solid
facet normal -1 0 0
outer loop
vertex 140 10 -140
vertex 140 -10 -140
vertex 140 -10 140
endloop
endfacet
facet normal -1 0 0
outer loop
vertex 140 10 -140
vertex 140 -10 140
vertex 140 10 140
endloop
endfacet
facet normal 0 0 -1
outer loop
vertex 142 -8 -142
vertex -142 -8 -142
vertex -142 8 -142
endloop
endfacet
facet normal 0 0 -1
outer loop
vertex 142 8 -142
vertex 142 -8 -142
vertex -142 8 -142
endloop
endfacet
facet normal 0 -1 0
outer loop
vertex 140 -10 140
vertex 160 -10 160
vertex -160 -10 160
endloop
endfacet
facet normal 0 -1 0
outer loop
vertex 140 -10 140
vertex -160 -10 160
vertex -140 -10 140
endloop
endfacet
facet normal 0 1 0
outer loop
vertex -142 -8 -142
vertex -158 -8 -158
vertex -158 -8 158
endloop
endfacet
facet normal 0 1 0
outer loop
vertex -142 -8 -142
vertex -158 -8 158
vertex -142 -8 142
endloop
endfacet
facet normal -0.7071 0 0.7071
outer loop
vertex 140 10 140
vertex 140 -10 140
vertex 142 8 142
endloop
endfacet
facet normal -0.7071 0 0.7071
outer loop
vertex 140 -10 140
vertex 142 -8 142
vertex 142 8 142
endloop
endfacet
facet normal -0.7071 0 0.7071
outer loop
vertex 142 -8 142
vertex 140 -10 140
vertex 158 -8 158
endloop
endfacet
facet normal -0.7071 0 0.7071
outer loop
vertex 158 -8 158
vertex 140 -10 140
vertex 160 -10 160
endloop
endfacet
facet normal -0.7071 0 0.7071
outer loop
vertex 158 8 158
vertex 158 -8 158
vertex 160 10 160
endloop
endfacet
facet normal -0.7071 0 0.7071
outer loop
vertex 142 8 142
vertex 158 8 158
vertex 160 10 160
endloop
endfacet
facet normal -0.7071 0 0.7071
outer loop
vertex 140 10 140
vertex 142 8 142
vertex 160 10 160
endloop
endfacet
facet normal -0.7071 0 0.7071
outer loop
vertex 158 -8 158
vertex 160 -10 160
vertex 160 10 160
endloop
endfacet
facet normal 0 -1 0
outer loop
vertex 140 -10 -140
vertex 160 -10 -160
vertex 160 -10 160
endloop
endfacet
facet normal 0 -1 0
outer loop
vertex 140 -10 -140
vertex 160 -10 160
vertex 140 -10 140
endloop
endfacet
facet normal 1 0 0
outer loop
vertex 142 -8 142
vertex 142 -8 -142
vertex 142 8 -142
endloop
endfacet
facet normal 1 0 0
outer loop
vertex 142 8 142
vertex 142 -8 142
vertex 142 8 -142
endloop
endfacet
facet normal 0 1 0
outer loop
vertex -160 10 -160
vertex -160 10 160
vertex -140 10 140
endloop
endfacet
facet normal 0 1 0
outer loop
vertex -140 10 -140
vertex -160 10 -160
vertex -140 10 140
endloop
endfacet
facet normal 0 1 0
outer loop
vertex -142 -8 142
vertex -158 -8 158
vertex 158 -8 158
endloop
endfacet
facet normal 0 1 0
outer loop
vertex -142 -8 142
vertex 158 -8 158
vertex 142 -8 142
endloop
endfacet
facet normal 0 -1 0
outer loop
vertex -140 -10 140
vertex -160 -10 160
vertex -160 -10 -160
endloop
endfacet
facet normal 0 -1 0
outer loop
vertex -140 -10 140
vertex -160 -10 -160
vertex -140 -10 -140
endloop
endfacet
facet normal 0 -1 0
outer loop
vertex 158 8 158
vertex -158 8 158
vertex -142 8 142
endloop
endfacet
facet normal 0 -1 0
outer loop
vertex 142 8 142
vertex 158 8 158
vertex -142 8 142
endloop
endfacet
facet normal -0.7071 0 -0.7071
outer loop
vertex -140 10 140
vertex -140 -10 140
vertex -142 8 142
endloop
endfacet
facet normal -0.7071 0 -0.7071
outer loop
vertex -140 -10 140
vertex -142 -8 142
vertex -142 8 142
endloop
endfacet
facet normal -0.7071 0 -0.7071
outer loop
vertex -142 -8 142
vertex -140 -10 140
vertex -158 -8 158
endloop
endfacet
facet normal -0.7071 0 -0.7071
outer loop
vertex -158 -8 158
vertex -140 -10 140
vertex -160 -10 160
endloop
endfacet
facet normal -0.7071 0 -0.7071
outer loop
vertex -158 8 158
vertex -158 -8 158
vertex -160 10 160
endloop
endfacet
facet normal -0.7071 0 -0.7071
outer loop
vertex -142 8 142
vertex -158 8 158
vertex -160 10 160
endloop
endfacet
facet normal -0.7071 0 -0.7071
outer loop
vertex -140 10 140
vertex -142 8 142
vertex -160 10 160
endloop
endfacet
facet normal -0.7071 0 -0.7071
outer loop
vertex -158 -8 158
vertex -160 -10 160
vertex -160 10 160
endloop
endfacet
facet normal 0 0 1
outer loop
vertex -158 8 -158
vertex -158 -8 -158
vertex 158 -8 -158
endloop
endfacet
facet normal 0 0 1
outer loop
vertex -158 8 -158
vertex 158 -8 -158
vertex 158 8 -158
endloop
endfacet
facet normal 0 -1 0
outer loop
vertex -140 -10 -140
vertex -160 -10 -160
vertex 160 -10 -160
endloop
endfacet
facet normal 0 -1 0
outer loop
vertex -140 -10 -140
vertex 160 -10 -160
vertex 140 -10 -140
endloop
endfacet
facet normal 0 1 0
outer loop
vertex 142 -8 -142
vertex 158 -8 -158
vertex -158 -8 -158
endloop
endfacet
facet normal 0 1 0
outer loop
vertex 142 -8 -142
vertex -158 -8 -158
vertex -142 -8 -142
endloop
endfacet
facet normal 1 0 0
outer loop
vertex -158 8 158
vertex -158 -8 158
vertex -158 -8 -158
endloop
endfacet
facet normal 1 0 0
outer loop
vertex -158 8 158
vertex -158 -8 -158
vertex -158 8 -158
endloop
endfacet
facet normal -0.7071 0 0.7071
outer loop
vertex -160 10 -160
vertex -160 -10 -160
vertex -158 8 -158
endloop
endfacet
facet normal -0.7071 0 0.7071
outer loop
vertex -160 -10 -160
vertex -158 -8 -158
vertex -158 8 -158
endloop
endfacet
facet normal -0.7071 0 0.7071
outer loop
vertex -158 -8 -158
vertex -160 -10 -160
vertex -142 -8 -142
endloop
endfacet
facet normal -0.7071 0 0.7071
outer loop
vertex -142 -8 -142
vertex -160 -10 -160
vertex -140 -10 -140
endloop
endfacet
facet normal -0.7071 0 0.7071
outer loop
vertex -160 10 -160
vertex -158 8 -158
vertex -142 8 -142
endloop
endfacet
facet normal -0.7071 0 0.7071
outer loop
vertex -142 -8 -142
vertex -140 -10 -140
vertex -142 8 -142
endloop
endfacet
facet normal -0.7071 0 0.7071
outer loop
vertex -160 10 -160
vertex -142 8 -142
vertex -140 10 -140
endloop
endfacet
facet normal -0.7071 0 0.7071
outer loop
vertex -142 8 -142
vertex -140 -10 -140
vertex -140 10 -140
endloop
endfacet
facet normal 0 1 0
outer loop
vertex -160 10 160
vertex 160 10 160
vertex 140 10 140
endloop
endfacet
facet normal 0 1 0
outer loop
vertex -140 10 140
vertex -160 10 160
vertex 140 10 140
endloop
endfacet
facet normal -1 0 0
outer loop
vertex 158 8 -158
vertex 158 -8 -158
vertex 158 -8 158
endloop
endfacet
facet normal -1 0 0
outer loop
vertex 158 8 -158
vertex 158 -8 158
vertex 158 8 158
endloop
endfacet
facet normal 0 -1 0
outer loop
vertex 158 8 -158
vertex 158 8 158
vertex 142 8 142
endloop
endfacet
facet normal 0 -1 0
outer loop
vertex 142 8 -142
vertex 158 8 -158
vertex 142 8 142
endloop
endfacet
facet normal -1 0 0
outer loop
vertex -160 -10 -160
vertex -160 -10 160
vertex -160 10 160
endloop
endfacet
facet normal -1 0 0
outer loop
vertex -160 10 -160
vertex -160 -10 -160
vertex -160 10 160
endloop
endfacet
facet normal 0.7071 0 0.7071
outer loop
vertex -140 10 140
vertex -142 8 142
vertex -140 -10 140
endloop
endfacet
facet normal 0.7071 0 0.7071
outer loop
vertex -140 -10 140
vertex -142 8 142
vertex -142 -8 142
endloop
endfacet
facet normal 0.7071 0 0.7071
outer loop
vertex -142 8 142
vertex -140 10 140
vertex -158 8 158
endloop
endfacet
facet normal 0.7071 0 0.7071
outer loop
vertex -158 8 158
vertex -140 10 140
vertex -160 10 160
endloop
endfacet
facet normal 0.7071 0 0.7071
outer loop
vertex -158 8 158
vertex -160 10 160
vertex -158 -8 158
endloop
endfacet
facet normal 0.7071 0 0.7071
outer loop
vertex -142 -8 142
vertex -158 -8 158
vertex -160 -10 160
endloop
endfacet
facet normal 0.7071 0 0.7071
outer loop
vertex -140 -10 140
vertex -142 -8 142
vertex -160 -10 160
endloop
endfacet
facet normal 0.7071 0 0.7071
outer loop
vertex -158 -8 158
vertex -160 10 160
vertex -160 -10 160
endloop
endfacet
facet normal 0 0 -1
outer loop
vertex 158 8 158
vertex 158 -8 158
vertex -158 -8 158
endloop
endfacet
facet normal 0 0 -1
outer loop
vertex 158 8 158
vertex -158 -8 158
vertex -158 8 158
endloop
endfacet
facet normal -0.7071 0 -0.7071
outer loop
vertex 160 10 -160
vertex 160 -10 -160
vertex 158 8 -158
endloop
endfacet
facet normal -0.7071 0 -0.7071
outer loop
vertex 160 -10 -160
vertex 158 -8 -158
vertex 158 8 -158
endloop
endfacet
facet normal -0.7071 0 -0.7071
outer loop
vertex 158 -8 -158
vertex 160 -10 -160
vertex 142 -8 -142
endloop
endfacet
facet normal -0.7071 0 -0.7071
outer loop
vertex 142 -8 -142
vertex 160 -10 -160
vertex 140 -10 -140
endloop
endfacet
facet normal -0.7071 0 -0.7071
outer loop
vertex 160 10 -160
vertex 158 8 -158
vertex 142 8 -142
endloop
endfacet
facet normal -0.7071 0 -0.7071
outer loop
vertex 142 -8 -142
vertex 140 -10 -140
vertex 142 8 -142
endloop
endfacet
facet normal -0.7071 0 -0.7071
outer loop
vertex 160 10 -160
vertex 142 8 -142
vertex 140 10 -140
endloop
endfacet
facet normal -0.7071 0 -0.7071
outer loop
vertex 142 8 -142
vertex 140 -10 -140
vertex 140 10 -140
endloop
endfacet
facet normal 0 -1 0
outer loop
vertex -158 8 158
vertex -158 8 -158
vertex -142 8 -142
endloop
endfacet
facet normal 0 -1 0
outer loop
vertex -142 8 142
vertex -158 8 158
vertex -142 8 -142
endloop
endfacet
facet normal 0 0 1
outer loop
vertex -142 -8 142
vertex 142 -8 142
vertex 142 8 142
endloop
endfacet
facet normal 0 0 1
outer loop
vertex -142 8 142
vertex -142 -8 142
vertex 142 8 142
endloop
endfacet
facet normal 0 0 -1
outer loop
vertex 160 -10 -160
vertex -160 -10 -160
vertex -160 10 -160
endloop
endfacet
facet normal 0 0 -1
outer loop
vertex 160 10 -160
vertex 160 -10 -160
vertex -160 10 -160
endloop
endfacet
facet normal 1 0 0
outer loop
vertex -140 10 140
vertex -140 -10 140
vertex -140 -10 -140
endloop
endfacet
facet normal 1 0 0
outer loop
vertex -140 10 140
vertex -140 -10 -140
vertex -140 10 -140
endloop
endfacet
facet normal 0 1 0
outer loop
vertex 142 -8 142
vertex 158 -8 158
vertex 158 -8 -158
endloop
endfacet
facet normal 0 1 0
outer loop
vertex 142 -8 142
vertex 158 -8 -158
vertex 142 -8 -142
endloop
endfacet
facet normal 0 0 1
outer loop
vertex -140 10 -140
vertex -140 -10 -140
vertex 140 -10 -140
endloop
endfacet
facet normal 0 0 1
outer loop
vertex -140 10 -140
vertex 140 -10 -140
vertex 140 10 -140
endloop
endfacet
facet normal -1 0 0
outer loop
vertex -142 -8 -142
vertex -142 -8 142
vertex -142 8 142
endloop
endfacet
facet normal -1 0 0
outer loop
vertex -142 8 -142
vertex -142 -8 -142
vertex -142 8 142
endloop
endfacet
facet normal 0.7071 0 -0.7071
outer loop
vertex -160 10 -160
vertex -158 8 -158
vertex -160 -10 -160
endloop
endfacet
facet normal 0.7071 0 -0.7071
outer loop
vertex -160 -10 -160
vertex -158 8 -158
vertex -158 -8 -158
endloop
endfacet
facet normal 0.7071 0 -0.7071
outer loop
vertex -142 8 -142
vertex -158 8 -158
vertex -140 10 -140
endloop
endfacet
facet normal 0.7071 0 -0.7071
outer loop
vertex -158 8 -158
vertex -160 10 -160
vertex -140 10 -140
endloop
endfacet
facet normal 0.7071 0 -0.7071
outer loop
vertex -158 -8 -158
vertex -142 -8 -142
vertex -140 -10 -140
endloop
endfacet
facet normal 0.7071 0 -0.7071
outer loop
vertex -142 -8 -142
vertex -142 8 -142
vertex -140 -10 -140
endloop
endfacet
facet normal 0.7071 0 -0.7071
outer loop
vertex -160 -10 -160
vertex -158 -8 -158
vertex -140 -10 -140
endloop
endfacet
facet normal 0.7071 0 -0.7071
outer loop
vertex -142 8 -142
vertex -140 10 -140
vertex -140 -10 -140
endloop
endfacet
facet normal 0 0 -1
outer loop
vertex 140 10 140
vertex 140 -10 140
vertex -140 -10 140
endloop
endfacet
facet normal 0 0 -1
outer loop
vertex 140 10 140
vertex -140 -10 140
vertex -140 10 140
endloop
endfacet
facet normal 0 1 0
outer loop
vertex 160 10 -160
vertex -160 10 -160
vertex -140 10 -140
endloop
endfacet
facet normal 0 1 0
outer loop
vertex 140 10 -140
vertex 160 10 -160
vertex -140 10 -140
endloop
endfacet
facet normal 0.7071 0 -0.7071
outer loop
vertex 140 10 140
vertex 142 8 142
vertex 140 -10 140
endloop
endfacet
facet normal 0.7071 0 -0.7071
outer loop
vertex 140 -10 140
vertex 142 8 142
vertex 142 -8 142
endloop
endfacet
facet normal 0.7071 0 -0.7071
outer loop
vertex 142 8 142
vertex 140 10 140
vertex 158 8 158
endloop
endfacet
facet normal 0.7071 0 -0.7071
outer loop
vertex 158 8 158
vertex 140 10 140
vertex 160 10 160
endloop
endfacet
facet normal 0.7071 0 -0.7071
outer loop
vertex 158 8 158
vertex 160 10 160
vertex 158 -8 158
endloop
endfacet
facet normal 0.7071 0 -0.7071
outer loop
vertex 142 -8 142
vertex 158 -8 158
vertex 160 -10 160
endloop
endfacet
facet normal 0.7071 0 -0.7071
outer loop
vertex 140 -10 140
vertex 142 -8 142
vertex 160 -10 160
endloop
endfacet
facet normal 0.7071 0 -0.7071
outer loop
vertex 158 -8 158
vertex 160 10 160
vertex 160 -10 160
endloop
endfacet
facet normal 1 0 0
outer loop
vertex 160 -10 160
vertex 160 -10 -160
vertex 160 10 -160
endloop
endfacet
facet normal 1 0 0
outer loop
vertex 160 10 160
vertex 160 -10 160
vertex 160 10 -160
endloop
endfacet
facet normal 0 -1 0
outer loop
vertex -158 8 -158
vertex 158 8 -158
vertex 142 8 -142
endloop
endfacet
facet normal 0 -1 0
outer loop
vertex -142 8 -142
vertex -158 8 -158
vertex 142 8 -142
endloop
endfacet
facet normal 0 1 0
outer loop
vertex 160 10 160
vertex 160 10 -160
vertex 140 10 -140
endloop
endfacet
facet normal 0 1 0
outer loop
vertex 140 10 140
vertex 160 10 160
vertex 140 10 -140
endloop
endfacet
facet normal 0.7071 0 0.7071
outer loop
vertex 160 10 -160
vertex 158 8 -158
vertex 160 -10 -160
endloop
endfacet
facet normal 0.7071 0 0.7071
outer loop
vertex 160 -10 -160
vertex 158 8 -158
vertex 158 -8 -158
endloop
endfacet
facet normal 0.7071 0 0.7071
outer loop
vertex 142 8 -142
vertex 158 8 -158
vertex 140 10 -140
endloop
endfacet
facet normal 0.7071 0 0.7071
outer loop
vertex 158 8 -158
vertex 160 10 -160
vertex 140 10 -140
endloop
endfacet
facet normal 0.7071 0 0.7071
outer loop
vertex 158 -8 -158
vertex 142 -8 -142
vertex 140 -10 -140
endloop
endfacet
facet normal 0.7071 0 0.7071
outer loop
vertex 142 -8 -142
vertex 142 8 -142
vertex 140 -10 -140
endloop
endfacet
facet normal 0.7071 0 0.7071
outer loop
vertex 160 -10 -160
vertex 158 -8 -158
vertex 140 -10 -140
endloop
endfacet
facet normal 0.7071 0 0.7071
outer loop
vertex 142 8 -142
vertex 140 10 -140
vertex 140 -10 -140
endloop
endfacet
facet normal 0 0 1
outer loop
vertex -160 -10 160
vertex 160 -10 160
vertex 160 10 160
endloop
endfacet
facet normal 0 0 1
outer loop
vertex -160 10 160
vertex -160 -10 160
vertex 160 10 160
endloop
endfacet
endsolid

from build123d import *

# Parameters (mm, degrees)
TUBO_CUADRADO_20_X_20_X_2_2_DEPTH      = 315.142135624
TUBO_CUADRADO_20_X_20_X_2_2_DEPTH_BACK = 15.142135624
SKETCH1_W                              = 20
SKETCH1_H                              = 20
SKETCH1_W_2                            = 16
SKETCH1_H_2                            = 16
SKETCH1_ON_SEGMENT_2_W                 = 20
SKETCH1_ON_SEGMENT_2_H                 = 20
SKETCH1_ON_SEGMENT_2_W_2               = 16
SKETCH1_ON_SEGMENT_2_H_2               = 16
TUBO_CUADRADO_20_X_20_X_2_2_2_DEPTH    = 330.284271247
SKETCH1_ON_SEGMENT_3_W                 = 20
SKETCH1_ON_SEGMENT_3_H                 = 20
SKETCH1_ON_SEGMENT_3_W_2               = 16
SKETCH1_ON_SEGMENT_3_H_2               = 16
TUBO_CUADRADO_20_X_20_X_2_2_3_DEPTH    = 330.284271247
SKETCH1_ON_SEGMENT_4_W                 = 20
SKETCH1_ON_SEGMENT_4_H                 = 20
SKETCH1_ON_SEGMENT_4_W_2               = 16
SKETCH1_ON_SEGMENT_4_H_2               = 16
TUBO_CUADRADO_20_X_20_X_2_2_4_DEPTH    = 330.284271247


with BuildPart() as part:
    # Sketch1 → Tubo cuadrado 20 X 20 X 2(2) (new, two sides: drawn at the far end of the back side and taken through both)
    with BuildSketch(Plane(origin=(-150, 0, -150), x_dir=(1, 0, 0), z_dir=(0, 0, 1)).offset(-TUBO_CUADRADO_20_X_20_X_2_2_DEPTH_BACK)):
        Rectangle(SKETCH1_W, SKETCH1_H)
        Rectangle(SKETCH1_W_2, SKETCH1_H_2, mode=Mode.SUBTRACT)
    extrude(amount=TUBO_CUADRADO_20_X_20_X_2_2_DEPTH + TUBO_CUADRADO_20_X_20_X_2_2_DEPTH_BACK)

    # Tubo cuadrado 20 X 20 X 2(2) mitre 1
    split(bisect_by=Plane(origin=(-150, 0, -150), x_dir=(0, -1, 0), z_dir=(-0.707106781, 0, 0.707106781)), keep=Keep.TOP)

    # Tubo cuadrado 20 X 20 X 2(2) mitre 2
    split(bisect_by=Plane(origin=(-150, 0, 150), x_dir=(0, -1, 0), z_dir=(-0.707106781, 0, -0.707106781)), keep=Keep.TOP)


with BuildPart() as body_2:
    # Sketch1 on segment 2 (carried to segment 2) → Tubo cuadrado 20 X 20 X 2_2 2 (new body)
    with BuildSketch(Plane(origin=(-165.142135624, 0, 150), x_dir=(0, 0, -1), z_dir=(1, 0, 0))):
        Rectangle(SKETCH1_ON_SEGMENT_2_W, SKETCH1_ON_SEGMENT_2_H)
        Rectangle(SKETCH1_ON_SEGMENT_2_W_2, SKETCH1_ON_SEGMENT_2_H_2, mode=Mode.SUBTRACT)
    extrude(amount=TUBO_CUADRADO_20_X_20_X_2_2_2_DEPTH)

    # Tubo cuadrado 20 X 20 X 2_2 2 mitre 1
    split(bisect_by=Plane(origin=(-150, 0, 150), x_dir=(0, 1, 0), z_dir=(0.707106781, 0, 0.707106781)), keep=Keep.TOP)

    # Tubo cuadrado 20 X 20 X 2_2 2 mitre 2
    split(bisect_by=Plane(origin=(150, 0, 150), x_dir=(0, -1, 0), z_dir=(-0.707106781, 0, 0.707106781)), keep=Keep.TOP)


with BuildPart() as body_3:
    # Sketch1 on segment 3 (carried to segment 3) → Tubo cuadrado 20 X 20 X 2_2 3 (new body)
    with BuildSketch(Plane(origin=(150, 0, 165.142135624), x_dir=(-1, 0, 0), z_dir=(0, 0, -1))):
        Rectangle(SKETCH1_ON_SEGMENT_3_W, SKETCH1_ON_SEGMENT_3_H)
        Rectangle(SKETCH1_ON_SEGMENT_3_W_2, SKETCH1_ON_SEGMENT_3_H_2, mode=Mode.SUBTRACT)
    extrude(amount=TUBO_CUADRADO_20_X_20_X_2_2_3_DEPTH)

    # Tubo cuadrado 20 X 20 X 2_2 3 mitre 1
    split(bisect_by=Plane(origin=(150, 0, -150), x_dir=(0, 1, 0), z_dir=(0.707106781, 0, 0.707106781)), keep=Keep.TOP)

    # Tubo cuadrado 20 X 20 X 2_2 3 mitre 2
    split(bisect_by=Plane(origin=(150, 0, 150), x_dir=(0, 1, 0), z_dir=(0.707106781, 0, -0.707106781)), keep=Keep.TOP)


with BuildPart() as body_4:
    # Sketch1 on segment 4 (carried to segment 4) → Tubo cuadrado 20 X 20 X 2_2 4 (new body)
    with BuildSketch(Plane(origin=(165.142135624, 0, -150), x_dir=(0, 0, 1), z_dir=(-1, 0, 0))):
        Rectangle(SKETCH1_ON_SEGMENT_4_W, SKETCH1_ON_SEGMENT_4_H)
        Rectangle(SKETCH1_ON_SEGMENT_4_W_2, SKETCH1_ON_SEGMENT_4_H_2, mode=Mode.SUBTRACT)
    extrude(amount=TUBO_CUADRADO_20_X_20_X_2_2_4_DEPTH)

    # Tubo cuadrado 20 X 20 X 2_2 4 mitre 1
    split(bisect_by=Plane(origin=(-150, 0, -150), x_dir=(0, 1, 0), z_dir=(0.707106781, 0, -0.707106781)), keep=Keep.TOP)

    # Tubo cuadrado 20 X 20 X 2_2 4 mitre 2
    split(bisect_by=Plane(origin=(150, 0, -150), x_dir=(0, -1, 0), z_dir=(-0.707106781, 0, -0.707106781)), keep=Keep.TOP)


solid = Compound([part.part, body_2.part, body_3.part, body_4.part])
